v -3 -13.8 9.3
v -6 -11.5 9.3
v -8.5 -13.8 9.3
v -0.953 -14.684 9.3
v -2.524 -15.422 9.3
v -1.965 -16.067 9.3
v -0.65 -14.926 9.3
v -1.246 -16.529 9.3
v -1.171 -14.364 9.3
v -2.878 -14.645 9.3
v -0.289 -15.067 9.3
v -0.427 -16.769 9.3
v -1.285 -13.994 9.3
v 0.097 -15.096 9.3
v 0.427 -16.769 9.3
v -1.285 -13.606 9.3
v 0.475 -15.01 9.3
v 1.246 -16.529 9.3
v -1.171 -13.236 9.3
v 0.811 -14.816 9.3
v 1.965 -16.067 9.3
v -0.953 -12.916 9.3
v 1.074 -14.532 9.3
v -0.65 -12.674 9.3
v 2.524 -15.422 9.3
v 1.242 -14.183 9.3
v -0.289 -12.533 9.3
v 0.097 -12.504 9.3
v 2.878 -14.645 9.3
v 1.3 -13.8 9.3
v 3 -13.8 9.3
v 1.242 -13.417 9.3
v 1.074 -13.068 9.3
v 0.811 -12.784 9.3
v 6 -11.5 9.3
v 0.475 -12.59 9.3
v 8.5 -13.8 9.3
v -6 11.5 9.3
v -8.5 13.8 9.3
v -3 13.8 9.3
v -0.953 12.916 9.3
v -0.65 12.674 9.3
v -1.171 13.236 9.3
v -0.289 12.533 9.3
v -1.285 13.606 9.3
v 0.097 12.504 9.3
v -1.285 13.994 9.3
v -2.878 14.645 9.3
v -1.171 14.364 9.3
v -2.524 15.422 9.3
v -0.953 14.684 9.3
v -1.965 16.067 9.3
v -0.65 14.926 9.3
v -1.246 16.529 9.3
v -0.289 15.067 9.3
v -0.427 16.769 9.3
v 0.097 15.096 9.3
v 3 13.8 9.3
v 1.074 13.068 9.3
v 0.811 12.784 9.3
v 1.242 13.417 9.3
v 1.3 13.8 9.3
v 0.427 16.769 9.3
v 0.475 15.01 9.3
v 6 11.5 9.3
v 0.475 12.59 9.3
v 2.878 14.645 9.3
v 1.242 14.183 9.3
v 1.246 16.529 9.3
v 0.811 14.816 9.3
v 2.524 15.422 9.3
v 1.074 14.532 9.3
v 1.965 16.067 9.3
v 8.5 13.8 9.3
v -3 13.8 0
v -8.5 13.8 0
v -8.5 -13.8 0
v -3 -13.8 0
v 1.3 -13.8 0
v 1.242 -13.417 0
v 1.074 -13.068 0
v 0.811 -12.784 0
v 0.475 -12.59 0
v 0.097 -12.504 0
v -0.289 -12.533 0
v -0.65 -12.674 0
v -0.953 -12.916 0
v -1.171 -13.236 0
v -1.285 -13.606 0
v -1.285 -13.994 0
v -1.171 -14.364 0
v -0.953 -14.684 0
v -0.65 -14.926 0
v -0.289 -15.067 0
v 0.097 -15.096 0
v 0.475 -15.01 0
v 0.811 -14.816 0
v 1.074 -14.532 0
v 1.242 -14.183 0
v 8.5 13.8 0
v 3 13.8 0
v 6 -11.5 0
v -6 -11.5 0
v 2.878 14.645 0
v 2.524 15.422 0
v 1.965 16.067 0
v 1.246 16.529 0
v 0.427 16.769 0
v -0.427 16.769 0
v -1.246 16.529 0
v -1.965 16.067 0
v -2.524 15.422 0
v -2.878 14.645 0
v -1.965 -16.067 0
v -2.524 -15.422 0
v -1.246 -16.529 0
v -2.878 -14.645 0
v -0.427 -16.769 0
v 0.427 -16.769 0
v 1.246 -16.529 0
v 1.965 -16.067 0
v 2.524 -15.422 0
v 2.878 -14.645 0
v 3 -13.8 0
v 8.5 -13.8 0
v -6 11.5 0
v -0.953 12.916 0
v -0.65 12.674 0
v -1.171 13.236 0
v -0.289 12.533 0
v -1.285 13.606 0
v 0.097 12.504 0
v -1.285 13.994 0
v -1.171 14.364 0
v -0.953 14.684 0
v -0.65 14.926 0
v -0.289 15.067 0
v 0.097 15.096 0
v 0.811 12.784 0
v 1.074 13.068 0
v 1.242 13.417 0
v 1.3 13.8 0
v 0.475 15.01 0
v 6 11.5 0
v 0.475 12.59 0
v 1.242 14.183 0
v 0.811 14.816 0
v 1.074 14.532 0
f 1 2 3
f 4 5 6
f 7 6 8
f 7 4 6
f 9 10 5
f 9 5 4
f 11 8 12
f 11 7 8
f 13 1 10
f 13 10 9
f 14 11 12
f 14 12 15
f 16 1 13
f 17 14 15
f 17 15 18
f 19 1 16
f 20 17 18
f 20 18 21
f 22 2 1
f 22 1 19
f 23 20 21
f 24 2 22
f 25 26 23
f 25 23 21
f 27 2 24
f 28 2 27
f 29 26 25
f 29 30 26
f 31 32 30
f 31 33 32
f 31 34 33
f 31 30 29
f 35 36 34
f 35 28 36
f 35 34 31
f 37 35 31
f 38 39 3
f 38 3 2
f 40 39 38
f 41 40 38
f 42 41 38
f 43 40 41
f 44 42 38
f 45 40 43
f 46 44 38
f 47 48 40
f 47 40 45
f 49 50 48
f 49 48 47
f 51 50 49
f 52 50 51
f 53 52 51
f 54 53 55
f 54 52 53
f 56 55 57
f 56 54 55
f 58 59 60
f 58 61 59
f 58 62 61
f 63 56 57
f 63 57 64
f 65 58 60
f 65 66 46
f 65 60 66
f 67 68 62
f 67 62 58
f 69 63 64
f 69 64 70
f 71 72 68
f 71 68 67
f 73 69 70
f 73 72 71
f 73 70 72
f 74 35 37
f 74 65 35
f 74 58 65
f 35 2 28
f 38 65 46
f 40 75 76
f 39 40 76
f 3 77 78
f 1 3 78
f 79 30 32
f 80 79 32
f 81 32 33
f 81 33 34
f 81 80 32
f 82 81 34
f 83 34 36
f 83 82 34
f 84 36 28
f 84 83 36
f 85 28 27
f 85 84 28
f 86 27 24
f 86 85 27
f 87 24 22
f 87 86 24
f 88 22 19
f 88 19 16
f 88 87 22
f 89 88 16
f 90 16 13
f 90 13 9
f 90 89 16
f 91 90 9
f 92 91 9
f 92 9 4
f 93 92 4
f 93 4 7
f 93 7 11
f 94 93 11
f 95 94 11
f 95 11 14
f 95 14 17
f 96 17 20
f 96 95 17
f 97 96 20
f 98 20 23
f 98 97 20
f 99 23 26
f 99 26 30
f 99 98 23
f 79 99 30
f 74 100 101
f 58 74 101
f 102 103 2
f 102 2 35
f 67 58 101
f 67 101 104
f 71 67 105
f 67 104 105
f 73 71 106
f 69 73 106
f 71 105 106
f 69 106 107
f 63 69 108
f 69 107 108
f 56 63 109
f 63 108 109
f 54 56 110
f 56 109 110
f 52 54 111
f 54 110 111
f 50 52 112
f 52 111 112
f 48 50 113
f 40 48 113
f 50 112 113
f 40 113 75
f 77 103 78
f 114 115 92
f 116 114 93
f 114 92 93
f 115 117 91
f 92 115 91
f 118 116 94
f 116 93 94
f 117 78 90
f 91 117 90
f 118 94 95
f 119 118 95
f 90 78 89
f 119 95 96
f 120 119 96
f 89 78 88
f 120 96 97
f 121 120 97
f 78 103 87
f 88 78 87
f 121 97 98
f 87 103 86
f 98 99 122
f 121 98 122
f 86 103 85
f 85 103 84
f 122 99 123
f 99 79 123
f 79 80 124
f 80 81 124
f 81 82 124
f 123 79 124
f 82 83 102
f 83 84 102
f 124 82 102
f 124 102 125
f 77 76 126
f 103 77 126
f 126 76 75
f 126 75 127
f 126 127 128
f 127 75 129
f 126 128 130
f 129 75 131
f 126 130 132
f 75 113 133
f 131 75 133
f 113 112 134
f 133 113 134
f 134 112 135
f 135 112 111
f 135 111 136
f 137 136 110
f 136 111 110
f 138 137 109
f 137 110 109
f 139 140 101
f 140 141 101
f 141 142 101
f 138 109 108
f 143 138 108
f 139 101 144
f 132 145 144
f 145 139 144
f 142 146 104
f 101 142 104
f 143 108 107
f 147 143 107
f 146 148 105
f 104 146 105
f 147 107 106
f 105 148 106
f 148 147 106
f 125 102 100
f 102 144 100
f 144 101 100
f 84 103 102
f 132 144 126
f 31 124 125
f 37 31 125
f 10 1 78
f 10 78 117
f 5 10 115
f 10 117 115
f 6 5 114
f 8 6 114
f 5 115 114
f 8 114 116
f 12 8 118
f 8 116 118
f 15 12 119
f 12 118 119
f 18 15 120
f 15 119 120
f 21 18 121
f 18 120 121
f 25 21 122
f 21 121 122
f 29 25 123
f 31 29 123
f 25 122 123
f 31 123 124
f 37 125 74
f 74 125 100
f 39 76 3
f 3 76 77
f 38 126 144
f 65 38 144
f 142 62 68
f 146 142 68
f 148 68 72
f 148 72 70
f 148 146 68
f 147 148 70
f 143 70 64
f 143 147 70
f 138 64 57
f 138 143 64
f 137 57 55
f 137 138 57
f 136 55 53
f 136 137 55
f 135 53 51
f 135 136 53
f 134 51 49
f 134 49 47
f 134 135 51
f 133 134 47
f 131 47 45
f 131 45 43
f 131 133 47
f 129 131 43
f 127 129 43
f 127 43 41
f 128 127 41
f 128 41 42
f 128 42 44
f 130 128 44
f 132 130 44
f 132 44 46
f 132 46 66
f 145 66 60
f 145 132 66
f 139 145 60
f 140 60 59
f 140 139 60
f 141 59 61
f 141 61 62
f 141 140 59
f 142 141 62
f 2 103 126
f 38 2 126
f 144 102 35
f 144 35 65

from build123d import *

# Parameters (mm, degrees)
SKETCH1_R           = 1.3
SKETCH1_W           = 12
SKETCH1_H           = 23
BOSS_EXTRUDE1_DEPTH = 9.3


with BuildPart() as part:
    # Sketch1 → Boss-Extrude1 (new body)
    with BuildSketch(Plane.XY):
        with BuildLine():
            Line((-3, 13.8), (-8.5, 13.8))
            Line((-8.5, 13.8), (-8.5, -13.8))
            Line((-8.5, -13.8), (-3, -13.8))
            ThreePointArc((-3, -13.8), (0, -16.8), (3, -13.8))
            Line((3, -13.8), (8.5, -13.8))
            Line((8.5, -13.8), (8.5, 13.8))
            Line((8.5, 13.8), (3, 13.8))
            ThreePointArc((3, 13.8), (0, 16.8), (-3, 13.8))
        make_face()
        with Locations((0, 13.8)):
            Circle(SKETCH1_R, mode=Mode.SUBTRACT)
        with Locations((0, -13.8)):
            Circle(SKETCH1_R, mode=Mode.SUBTRACT)
        Rectangle(SKETCH1_W, SKETCH1_H, mode=Mode.SUBTRACT)
    extrude(amount=BOSS_EXTRUDE1_DEPTH)


solid = part.part
